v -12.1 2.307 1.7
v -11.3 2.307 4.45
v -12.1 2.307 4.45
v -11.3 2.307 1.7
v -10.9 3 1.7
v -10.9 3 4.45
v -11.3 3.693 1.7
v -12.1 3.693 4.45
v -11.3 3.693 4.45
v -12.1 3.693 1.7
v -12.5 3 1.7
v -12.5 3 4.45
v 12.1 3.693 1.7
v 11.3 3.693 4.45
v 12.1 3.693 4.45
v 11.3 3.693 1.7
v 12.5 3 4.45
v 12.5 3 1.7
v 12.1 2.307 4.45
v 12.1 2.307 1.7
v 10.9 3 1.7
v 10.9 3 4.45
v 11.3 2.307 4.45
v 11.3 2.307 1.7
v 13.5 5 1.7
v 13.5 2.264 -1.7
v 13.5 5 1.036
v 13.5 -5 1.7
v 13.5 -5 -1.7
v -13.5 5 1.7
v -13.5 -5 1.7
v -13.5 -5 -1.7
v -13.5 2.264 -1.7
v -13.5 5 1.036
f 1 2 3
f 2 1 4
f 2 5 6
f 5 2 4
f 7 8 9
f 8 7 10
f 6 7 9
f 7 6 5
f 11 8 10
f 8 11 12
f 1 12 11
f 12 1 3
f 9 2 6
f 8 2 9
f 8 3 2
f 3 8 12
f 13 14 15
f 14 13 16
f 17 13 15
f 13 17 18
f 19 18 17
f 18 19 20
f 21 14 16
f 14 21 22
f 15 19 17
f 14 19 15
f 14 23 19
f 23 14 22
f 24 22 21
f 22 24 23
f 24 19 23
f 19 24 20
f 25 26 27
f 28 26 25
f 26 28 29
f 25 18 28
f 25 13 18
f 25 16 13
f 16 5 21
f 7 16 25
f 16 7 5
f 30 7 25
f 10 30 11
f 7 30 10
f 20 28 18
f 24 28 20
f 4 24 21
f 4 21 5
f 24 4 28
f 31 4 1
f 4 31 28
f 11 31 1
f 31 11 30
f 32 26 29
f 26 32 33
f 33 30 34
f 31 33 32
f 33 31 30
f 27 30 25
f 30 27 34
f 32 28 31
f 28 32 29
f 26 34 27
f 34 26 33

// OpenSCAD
body=[27,10,3.4];
hole_d=1.6;
hole_h=2.7;
hole_dist=23.4;

hdmi_width=17;
hdmi_height=14;
audio_width=5;
audio_height=13;
voltage_width=8;
voltage_height=7;

difference()
{
  union()
  {
    cube(body,center=true);
    // screw pins
    for(i=[-1:2:1])
      translate([hole_dist/2*i,3,body[2]/2+hole_h/2])
      cylinder(d=hole_d,h=hole_h+0.1,$fn=6,center=true);
  }
  // cut clearing for ribbon cable
  if(0)
  translate([0,0,body[2]/2])
    cube([hole_dist-5,20,2],center=true);
  // cut bottom stand
  // dip switch 
  // hdmi capacitors
  if(0)
  translate([-hole_dist/2+hdmi_width/2-3,+5,-body[2]/2])
    cube([hdmi_width,10,hdmi_height],center=true);
  // voltage selector
  if(0)
  translate([+hole_dist/2-voltage_width/2+0.01,-6,-body[2]/2])
    cube([voltage_width,10,voltage_height],center=true);
  // audio jack
  if(0)
  translate([hole_dist/2+audio_width/2,0,-body[2]/2])
    cube([audio_width,10,audio_height],center=true);
  // 45 deg transition
  if(1)
  translate([0,7.5,0])
    rotate([45,0,0])
      cube([40,40,audio_width],center=true);
}
